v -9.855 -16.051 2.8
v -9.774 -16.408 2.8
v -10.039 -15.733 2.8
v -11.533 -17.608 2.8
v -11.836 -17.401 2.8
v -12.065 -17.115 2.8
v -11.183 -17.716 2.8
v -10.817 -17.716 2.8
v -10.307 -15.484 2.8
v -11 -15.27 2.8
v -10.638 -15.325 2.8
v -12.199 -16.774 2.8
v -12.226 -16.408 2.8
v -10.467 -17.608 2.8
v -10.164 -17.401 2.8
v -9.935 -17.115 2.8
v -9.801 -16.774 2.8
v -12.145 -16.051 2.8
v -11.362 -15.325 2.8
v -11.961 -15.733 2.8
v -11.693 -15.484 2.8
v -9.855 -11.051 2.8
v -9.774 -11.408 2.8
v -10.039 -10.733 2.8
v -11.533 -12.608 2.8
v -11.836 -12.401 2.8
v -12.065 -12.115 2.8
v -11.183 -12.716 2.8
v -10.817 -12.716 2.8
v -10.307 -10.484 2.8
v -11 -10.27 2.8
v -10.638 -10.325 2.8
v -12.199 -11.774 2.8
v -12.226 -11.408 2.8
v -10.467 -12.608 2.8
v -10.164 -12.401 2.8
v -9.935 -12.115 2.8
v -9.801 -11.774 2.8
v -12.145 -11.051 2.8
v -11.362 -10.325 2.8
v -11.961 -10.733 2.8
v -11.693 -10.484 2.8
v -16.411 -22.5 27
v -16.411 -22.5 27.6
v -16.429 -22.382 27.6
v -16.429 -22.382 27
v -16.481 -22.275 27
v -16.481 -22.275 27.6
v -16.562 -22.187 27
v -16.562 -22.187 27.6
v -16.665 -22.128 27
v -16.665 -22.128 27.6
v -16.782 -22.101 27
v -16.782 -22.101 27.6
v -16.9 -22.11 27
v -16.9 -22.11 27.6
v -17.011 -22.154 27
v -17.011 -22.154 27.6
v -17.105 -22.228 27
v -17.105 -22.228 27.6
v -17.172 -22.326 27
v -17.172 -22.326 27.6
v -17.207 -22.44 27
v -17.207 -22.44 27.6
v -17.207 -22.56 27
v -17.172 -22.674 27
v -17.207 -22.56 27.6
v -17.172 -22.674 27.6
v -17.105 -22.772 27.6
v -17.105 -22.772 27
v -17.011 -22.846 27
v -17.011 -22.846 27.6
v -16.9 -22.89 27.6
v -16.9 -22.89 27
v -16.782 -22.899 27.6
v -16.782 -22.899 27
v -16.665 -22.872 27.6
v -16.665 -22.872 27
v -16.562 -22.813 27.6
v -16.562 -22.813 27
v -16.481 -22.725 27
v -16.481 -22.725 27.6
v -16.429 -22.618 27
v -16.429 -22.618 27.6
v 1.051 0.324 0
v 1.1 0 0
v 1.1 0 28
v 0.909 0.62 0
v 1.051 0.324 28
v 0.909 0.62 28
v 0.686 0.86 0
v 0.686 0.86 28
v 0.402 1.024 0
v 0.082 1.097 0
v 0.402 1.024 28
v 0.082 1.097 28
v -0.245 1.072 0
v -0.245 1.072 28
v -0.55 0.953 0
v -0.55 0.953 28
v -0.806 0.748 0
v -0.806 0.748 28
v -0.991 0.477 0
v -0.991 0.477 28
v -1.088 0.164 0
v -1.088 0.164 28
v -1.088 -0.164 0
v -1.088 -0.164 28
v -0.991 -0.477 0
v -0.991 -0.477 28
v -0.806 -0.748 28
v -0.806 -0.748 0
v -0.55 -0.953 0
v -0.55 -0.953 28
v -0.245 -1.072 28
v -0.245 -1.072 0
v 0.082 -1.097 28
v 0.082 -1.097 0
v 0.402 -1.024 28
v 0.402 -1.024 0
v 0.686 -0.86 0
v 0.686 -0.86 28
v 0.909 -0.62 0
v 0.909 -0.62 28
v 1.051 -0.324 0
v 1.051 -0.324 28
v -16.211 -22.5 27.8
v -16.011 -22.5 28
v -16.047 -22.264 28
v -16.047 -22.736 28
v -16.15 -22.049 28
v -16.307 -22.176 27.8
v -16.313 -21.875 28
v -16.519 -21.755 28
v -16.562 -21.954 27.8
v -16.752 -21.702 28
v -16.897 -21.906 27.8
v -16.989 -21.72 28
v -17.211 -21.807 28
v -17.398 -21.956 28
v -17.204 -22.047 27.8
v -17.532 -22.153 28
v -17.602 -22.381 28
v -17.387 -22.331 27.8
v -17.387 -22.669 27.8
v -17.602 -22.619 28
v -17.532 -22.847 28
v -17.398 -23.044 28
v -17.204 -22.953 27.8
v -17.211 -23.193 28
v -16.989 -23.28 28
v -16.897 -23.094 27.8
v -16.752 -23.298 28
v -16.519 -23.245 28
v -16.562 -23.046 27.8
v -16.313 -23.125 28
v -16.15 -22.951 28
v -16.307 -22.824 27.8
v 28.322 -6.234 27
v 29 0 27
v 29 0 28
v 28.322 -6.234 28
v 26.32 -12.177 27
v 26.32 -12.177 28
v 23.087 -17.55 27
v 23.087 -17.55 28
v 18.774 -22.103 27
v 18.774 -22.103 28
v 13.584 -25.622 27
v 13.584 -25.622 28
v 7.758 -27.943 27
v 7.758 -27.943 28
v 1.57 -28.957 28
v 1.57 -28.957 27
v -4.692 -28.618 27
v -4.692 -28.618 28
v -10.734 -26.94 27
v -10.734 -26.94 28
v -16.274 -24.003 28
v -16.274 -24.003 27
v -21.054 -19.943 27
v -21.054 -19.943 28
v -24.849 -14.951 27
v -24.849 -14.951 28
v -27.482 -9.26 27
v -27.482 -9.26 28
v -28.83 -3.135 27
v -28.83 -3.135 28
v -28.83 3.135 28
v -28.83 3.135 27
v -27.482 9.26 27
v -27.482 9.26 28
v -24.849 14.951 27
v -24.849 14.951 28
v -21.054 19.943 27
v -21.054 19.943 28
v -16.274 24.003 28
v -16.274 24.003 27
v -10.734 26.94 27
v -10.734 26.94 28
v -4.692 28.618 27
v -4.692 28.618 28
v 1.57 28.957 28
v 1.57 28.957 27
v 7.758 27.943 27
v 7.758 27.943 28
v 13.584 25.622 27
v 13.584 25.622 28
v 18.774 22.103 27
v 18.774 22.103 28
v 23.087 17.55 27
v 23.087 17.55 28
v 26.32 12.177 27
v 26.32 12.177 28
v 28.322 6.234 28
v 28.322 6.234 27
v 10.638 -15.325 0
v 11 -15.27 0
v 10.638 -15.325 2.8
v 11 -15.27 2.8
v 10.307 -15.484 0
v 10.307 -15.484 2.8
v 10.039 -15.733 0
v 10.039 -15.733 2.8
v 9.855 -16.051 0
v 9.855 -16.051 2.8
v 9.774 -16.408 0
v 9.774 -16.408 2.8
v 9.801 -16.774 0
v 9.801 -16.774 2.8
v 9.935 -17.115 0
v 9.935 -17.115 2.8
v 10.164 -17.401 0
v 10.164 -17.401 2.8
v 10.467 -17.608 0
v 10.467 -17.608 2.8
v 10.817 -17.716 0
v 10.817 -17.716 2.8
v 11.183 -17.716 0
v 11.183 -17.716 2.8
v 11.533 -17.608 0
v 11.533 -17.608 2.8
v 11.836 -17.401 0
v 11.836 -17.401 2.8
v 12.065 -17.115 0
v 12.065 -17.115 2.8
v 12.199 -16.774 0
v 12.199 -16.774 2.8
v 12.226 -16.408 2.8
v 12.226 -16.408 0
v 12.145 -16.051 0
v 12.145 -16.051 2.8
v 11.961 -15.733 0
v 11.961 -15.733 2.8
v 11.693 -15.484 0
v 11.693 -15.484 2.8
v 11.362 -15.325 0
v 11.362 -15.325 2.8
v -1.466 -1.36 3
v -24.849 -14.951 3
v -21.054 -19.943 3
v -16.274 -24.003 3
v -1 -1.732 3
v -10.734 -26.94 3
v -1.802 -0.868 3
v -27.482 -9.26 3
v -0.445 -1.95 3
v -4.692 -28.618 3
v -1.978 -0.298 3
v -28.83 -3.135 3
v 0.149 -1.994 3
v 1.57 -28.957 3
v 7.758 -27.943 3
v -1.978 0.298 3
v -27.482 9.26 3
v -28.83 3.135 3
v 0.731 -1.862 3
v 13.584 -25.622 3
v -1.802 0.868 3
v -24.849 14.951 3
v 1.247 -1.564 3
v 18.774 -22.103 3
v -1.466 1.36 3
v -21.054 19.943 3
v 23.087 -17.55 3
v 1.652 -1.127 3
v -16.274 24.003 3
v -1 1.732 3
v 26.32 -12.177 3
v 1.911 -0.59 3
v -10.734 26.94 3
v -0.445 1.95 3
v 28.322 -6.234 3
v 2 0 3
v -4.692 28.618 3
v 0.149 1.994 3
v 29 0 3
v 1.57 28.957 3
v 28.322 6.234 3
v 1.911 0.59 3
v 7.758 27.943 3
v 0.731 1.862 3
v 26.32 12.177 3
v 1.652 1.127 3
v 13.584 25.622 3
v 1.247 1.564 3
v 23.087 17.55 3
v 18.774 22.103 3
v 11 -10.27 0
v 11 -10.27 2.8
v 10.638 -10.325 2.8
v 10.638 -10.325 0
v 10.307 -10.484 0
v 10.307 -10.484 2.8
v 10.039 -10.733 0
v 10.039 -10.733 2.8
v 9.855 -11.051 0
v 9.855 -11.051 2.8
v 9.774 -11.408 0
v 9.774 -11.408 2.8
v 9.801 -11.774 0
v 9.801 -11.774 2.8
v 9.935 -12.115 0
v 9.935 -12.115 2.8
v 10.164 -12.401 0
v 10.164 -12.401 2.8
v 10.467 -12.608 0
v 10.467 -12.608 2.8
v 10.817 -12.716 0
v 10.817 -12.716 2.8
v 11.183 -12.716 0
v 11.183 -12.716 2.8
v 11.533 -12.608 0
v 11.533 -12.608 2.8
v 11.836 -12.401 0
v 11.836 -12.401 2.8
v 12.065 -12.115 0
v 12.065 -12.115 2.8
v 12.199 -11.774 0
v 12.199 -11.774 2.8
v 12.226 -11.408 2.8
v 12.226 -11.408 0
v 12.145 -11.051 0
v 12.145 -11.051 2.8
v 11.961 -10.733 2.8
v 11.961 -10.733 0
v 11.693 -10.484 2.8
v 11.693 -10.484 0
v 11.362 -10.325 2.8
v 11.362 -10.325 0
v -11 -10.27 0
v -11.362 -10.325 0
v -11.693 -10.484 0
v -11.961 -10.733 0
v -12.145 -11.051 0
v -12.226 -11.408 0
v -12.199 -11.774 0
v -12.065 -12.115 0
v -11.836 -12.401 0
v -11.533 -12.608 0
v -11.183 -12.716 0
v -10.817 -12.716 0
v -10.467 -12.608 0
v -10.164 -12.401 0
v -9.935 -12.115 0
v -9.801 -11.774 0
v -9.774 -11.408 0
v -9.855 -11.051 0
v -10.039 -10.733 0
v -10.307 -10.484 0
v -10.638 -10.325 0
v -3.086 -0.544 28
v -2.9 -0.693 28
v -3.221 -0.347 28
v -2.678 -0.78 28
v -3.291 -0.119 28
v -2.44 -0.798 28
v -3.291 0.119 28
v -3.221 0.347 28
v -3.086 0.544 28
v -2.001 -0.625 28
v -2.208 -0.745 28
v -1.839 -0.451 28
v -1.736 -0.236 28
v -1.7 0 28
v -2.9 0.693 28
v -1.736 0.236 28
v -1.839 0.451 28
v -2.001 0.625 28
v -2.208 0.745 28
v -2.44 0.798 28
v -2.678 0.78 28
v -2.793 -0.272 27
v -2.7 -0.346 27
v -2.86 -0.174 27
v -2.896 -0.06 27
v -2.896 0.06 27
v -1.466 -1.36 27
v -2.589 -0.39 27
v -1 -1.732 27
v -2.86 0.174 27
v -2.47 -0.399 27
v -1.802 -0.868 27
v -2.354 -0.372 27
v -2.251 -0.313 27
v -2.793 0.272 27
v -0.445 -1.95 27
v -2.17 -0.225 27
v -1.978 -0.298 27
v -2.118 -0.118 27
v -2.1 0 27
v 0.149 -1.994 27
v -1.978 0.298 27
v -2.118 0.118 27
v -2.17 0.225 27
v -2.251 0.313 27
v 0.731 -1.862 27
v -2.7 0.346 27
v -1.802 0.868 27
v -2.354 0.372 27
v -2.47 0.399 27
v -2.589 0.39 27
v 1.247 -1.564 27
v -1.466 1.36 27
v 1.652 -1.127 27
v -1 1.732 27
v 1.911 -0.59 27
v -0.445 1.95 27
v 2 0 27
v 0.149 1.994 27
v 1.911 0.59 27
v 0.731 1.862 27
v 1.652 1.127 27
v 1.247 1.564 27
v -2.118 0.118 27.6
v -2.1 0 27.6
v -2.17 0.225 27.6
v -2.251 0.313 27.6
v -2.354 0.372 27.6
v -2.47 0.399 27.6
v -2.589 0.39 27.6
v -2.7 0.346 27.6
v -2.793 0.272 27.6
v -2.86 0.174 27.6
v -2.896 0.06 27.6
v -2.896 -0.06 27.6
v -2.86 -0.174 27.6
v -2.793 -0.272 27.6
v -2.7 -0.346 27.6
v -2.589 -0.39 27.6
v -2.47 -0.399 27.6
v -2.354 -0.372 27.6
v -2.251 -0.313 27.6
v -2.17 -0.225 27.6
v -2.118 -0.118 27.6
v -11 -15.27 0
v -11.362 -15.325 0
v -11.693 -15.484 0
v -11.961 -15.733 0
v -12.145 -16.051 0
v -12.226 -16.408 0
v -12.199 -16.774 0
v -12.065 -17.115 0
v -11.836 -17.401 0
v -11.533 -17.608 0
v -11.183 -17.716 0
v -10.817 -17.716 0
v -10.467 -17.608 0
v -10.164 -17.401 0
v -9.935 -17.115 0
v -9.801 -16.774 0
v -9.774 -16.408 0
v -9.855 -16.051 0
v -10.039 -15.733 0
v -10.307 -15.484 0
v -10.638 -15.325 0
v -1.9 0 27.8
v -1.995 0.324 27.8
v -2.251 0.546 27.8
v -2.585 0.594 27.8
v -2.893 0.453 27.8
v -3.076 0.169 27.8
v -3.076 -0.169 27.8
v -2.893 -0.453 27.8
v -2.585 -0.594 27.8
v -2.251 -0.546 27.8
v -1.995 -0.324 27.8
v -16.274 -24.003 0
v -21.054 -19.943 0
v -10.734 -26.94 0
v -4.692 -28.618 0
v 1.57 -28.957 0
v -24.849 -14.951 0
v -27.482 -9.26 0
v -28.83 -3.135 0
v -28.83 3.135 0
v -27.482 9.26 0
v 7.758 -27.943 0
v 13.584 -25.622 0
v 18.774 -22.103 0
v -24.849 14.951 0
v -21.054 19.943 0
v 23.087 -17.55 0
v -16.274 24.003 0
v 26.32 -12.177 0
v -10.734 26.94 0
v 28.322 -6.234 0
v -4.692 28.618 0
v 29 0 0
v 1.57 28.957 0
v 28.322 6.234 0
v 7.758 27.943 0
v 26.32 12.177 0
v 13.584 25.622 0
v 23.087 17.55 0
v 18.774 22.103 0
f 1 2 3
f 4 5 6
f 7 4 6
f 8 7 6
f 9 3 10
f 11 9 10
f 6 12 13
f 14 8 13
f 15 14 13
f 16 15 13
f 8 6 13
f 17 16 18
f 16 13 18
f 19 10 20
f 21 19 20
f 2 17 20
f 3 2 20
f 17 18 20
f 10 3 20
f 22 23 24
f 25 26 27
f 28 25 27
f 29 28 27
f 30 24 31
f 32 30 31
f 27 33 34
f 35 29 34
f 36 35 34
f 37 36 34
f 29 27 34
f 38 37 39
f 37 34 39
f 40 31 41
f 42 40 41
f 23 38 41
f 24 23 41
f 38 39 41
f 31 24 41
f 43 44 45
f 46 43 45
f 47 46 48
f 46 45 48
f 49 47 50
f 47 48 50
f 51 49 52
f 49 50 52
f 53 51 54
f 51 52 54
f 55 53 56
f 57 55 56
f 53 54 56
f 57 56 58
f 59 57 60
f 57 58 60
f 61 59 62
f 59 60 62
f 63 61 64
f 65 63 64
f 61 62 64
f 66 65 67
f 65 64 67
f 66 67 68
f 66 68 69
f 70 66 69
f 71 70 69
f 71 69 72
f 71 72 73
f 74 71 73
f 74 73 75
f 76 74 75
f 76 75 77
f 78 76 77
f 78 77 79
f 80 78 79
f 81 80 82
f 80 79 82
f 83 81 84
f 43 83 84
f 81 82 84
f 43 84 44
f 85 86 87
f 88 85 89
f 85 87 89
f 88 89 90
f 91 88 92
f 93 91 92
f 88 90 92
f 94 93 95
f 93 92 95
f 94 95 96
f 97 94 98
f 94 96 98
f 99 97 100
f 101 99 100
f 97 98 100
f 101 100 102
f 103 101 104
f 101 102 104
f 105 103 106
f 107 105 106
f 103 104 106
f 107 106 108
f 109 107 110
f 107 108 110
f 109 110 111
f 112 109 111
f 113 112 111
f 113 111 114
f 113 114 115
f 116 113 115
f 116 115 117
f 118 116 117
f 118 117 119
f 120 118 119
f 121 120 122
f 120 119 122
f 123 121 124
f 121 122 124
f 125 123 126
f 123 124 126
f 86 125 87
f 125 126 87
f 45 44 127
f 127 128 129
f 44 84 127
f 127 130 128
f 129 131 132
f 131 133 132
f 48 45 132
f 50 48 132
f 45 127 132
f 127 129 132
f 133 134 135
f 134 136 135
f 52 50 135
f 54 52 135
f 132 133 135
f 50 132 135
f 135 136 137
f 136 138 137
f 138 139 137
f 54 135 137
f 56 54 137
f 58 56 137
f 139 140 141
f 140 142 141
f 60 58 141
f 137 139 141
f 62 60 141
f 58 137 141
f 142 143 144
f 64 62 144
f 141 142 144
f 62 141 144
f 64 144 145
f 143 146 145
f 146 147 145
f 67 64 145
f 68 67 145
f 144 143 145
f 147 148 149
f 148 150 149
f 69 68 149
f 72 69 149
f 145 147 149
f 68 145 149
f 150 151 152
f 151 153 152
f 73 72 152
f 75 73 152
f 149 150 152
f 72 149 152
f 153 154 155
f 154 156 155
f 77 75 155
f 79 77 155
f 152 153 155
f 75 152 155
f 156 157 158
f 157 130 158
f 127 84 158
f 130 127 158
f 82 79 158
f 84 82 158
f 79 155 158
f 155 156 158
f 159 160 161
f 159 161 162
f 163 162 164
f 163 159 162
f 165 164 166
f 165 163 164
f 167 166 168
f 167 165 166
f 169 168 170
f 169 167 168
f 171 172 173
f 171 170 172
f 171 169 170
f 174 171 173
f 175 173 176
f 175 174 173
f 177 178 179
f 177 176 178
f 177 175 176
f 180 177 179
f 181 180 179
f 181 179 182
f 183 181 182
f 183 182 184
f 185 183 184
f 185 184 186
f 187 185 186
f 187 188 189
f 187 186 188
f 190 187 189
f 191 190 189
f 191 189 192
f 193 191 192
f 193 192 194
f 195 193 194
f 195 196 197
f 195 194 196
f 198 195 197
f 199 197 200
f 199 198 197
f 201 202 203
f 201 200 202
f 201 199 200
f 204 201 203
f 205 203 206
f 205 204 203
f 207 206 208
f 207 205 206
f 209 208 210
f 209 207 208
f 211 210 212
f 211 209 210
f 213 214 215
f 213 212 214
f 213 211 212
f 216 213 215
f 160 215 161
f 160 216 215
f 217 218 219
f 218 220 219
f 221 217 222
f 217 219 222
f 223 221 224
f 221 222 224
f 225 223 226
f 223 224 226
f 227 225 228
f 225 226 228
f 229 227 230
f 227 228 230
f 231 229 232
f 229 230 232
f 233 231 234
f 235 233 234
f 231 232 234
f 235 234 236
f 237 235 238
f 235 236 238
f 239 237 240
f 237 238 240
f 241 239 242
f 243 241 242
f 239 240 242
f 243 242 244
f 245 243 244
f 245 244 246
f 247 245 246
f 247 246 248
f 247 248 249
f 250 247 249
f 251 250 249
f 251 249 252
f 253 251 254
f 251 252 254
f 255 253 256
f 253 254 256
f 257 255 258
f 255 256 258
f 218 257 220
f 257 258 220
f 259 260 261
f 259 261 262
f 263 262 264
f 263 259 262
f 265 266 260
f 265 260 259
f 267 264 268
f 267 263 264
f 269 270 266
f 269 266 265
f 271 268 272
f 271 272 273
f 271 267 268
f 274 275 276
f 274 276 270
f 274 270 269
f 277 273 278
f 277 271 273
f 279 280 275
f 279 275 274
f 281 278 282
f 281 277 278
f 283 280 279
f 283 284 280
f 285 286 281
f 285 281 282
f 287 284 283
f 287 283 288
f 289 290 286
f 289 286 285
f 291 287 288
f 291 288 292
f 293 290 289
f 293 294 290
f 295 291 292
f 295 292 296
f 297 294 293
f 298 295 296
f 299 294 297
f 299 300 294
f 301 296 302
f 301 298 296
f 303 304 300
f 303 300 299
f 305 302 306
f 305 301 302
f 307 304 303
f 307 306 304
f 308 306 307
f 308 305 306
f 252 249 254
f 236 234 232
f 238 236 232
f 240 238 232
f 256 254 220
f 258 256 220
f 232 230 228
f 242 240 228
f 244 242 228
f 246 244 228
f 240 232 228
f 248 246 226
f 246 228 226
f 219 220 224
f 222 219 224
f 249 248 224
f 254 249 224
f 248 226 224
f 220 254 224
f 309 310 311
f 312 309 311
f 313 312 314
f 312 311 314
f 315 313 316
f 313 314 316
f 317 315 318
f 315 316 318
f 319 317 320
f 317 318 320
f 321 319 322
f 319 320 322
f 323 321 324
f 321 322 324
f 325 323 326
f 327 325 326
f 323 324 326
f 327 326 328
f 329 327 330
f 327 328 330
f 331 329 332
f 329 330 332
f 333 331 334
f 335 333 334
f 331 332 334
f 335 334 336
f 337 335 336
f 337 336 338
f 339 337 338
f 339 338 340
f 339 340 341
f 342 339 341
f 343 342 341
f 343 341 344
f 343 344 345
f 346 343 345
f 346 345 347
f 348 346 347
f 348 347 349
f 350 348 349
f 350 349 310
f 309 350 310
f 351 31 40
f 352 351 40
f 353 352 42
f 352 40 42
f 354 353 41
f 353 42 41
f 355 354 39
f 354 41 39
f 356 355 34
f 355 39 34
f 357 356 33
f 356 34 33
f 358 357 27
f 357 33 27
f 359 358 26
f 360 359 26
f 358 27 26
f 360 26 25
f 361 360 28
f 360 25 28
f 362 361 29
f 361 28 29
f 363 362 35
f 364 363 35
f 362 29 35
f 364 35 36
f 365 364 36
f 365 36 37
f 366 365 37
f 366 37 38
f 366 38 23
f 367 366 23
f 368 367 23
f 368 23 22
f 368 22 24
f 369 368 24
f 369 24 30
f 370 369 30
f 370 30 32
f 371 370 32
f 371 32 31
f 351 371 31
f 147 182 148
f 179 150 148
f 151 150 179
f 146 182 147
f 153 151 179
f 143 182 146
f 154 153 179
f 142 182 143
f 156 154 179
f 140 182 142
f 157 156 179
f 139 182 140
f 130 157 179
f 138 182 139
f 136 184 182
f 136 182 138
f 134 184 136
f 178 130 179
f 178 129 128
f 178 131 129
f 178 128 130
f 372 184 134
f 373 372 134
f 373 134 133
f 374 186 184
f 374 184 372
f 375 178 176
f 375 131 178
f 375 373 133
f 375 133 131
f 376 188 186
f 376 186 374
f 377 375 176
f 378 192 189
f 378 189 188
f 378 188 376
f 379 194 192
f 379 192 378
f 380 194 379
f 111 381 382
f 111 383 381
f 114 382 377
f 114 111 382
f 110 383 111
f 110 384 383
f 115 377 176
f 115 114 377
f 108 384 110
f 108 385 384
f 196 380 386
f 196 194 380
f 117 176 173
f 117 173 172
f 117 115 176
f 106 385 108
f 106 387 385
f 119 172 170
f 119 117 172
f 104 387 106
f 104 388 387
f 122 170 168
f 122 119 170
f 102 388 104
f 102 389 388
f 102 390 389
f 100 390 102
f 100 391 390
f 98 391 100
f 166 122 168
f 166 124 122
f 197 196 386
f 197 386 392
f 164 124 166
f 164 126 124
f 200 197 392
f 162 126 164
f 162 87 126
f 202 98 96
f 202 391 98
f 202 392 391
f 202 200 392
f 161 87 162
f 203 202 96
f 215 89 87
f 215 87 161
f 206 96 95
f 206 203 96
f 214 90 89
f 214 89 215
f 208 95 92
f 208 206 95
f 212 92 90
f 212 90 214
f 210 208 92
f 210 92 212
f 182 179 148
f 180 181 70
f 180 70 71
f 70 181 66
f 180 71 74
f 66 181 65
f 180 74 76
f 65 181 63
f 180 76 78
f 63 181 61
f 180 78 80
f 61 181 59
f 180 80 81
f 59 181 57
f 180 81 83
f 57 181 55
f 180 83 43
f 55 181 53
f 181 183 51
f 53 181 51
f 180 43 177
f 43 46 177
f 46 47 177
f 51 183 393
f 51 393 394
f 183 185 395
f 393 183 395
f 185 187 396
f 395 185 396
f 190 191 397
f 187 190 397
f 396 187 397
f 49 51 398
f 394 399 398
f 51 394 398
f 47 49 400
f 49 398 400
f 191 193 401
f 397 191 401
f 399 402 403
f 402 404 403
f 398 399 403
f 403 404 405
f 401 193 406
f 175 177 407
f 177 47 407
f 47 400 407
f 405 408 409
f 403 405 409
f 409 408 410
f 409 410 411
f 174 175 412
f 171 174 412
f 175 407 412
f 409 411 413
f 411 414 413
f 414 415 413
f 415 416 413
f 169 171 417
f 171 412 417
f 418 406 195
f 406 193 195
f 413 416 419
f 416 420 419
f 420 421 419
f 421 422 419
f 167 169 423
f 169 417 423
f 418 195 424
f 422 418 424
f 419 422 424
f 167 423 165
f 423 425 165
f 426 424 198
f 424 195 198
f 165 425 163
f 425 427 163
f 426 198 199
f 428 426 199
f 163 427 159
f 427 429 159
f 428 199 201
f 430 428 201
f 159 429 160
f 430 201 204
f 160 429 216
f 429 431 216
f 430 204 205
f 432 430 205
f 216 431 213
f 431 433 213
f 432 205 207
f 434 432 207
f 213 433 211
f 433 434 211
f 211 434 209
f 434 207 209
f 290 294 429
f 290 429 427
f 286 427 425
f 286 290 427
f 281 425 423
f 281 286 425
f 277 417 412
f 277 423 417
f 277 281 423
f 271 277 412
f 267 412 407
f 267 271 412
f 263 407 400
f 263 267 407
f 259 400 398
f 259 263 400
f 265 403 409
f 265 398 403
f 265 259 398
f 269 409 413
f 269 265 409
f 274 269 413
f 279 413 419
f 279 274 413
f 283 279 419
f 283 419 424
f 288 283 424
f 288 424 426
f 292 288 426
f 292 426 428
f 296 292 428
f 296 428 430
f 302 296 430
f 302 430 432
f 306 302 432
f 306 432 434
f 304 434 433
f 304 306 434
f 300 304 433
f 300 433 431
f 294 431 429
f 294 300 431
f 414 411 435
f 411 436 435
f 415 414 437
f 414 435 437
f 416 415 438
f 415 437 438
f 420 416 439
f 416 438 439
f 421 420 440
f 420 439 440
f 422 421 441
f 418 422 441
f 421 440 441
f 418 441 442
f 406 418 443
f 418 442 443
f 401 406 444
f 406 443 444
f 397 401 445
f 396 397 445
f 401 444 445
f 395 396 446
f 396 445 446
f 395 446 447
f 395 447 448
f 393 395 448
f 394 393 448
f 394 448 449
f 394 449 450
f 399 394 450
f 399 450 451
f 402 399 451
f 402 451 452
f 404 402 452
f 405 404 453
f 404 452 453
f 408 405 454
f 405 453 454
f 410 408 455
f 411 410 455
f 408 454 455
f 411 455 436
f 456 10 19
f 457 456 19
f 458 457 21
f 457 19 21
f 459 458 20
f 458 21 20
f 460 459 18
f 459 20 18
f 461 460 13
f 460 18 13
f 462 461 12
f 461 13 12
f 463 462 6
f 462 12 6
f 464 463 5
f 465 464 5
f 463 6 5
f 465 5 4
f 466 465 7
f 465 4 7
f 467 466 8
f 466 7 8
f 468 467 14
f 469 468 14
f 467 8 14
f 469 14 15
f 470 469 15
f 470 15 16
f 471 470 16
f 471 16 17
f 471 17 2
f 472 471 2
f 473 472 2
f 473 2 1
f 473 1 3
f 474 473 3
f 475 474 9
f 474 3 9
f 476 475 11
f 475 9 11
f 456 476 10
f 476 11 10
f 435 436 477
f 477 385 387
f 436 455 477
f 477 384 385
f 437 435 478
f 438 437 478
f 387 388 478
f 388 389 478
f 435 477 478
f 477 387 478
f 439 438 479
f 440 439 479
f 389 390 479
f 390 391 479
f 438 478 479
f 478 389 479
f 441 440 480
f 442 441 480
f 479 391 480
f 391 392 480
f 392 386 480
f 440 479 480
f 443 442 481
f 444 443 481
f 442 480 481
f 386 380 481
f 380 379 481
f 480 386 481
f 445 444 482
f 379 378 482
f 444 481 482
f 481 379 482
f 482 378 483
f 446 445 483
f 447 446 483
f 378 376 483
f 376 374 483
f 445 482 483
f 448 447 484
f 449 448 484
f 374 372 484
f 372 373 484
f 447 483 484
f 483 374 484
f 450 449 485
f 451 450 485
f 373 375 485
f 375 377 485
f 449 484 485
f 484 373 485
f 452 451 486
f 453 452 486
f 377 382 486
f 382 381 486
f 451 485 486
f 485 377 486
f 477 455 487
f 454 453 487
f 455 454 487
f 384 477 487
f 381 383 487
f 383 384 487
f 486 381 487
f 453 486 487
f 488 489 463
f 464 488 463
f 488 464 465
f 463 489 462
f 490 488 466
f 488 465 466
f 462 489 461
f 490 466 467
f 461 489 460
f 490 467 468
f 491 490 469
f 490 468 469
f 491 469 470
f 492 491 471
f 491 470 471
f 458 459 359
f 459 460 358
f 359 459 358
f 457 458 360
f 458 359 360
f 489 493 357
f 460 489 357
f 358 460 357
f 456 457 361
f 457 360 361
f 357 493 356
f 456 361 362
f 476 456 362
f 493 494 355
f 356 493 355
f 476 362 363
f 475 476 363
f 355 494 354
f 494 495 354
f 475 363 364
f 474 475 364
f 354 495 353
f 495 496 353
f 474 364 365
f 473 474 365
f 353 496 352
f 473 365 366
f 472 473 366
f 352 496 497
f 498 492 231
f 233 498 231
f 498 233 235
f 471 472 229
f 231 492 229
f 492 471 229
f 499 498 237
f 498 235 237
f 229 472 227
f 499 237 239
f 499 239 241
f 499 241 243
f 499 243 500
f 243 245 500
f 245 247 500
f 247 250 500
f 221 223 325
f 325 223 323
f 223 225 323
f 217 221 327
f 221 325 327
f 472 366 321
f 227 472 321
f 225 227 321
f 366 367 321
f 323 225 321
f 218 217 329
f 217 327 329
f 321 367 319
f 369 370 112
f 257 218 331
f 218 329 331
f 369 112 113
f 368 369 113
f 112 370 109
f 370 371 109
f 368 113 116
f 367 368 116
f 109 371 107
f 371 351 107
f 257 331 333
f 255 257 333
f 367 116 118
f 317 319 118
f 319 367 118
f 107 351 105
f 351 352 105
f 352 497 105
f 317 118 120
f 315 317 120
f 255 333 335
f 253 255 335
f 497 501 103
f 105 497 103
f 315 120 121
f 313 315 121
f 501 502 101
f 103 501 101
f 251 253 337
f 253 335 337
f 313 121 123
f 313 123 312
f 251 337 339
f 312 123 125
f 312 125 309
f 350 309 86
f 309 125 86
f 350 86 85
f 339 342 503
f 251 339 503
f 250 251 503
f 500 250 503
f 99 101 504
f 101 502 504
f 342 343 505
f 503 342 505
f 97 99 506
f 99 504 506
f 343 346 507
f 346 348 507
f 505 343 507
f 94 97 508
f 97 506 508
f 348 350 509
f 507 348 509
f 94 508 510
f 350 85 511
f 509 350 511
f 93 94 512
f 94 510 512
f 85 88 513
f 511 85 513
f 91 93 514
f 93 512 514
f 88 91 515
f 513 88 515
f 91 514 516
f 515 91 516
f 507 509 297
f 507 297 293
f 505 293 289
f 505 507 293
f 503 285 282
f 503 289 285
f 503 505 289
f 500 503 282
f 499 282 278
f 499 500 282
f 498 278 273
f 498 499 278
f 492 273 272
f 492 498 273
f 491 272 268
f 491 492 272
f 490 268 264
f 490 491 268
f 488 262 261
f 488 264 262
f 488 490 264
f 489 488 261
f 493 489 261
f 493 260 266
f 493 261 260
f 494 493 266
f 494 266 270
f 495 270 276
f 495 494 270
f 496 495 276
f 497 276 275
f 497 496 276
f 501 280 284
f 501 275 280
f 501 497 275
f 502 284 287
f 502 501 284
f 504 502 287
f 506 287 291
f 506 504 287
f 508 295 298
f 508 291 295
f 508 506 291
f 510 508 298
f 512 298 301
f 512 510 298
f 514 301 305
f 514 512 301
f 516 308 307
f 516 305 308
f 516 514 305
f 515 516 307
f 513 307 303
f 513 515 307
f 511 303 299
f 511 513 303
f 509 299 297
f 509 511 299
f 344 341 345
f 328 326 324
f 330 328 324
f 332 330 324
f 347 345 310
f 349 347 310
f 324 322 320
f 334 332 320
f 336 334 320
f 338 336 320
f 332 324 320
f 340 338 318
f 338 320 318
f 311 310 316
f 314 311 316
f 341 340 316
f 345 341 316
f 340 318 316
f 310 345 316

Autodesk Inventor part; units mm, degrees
ref_plane "YZ Plane" through (0, 0, 0) normal (1, 0, 0) x (0, 1, 0)
ref_plane "XZ Plane" through (0, 0, 0) normal (0, 1, 0) x (-1, 0, 0)
ref_plane "XY Plane" through (0, 0, 0) normal (0, 0, 1) x (1, 0, 0)
sketch "Sketch1" plane through (0, 0, 0) normal (0, 0, 1) x (1, 0, 0)
  circle A0 centre (0, 0) radius 29
  dimension "d0" = 58
extrude "Extrusion1" add sketch "Sketch1" along normal blind 3
sketch "Sketch2" plane through (0, 0, 3) normal (0, 0, 1) x (1, 0, 0)
  circle A0 centre (0, 0) radius 2
  dimension "d3" = 4
extrude "Extrusion2" add sketch "Sketch2" along normal blind 24
sketch "Sketch3" plane through (0, 0, 27) normal (0, 0, 1) x (1, 0, 0)
  circle A0 centre (0, 0) radius 29
  dimension "d6" = 58
extrude "Extrusion3" add sketch "Sketch3" along normal blind 1
sketch "Sketch4" plane through (0, 0, 28) normal (0, 0, 1) x (1, 0, 0)
  circle A0 centre (0, 0) radius 1.1
  dimension "d9" = 2.2
extrude "Extrusion4" cut sketch "Sketch4" against normal through all
sketch "Sketch6" plane through (0, 0, 28) normal (0, 0, 1) x (1, 0, 0)
  circle A0 centre (0, 0) radius 2 construction
  circle A1 centre (-16.8114, -22.5) radius 0.4
  circle A2 centre (-2.5, 0) radius 0.4
  circle A3 centre (0, 0) radius 29 projected
  dimension "d20" = 0.8
  dimension "d21" = 0.8
  dimension "d32" = 2.5
  dimension "d41" = 22.5
sketch "Sketch7" plane through (0, 0, 28) normal (0, 0, 1) x (1, 0, 0)
  point P0 (0, 0)
extrude "Extrusion5" cut sketch "Sketch6" against normal up to surface (1 mm away) contours A1 | A2
chamfer "Chamfer1" distance 0.4 angle 45 2 edges at (-2.9, 0, 28) (-17.2114, -22.5, 28)
sketch "Sketch9" plane through (0, 0, 0) normal (0, 0, -1) x (-1, 0, 0)
  point P0 (0, 0)
  point P1 (11, -11.5)
  point P2 (-11, -11.5)
  point P3 (11, -16.5)
  point P4 (-11, -16.5)
  dimension "d44" = 11
  dimension "d45" = 11
  dimension "d46" = 11.5
  dimension "d47" = 11.5
  dimension "d48" = 5
  dimension "d49" = 5
hole "Hole2" at (11, -11.5, 0) at (-11, -11.5, 0) at (-11, -16.5, 0) at (11, -16.5, 0) direction (0, 0, 1) diameter 2.459 depth 2.8 thread size "M3x0.5" class "6H" standard "ISO Metric profile"
loft "Loft1" [suppressed]
properties part number "Bobbin_x_b"
